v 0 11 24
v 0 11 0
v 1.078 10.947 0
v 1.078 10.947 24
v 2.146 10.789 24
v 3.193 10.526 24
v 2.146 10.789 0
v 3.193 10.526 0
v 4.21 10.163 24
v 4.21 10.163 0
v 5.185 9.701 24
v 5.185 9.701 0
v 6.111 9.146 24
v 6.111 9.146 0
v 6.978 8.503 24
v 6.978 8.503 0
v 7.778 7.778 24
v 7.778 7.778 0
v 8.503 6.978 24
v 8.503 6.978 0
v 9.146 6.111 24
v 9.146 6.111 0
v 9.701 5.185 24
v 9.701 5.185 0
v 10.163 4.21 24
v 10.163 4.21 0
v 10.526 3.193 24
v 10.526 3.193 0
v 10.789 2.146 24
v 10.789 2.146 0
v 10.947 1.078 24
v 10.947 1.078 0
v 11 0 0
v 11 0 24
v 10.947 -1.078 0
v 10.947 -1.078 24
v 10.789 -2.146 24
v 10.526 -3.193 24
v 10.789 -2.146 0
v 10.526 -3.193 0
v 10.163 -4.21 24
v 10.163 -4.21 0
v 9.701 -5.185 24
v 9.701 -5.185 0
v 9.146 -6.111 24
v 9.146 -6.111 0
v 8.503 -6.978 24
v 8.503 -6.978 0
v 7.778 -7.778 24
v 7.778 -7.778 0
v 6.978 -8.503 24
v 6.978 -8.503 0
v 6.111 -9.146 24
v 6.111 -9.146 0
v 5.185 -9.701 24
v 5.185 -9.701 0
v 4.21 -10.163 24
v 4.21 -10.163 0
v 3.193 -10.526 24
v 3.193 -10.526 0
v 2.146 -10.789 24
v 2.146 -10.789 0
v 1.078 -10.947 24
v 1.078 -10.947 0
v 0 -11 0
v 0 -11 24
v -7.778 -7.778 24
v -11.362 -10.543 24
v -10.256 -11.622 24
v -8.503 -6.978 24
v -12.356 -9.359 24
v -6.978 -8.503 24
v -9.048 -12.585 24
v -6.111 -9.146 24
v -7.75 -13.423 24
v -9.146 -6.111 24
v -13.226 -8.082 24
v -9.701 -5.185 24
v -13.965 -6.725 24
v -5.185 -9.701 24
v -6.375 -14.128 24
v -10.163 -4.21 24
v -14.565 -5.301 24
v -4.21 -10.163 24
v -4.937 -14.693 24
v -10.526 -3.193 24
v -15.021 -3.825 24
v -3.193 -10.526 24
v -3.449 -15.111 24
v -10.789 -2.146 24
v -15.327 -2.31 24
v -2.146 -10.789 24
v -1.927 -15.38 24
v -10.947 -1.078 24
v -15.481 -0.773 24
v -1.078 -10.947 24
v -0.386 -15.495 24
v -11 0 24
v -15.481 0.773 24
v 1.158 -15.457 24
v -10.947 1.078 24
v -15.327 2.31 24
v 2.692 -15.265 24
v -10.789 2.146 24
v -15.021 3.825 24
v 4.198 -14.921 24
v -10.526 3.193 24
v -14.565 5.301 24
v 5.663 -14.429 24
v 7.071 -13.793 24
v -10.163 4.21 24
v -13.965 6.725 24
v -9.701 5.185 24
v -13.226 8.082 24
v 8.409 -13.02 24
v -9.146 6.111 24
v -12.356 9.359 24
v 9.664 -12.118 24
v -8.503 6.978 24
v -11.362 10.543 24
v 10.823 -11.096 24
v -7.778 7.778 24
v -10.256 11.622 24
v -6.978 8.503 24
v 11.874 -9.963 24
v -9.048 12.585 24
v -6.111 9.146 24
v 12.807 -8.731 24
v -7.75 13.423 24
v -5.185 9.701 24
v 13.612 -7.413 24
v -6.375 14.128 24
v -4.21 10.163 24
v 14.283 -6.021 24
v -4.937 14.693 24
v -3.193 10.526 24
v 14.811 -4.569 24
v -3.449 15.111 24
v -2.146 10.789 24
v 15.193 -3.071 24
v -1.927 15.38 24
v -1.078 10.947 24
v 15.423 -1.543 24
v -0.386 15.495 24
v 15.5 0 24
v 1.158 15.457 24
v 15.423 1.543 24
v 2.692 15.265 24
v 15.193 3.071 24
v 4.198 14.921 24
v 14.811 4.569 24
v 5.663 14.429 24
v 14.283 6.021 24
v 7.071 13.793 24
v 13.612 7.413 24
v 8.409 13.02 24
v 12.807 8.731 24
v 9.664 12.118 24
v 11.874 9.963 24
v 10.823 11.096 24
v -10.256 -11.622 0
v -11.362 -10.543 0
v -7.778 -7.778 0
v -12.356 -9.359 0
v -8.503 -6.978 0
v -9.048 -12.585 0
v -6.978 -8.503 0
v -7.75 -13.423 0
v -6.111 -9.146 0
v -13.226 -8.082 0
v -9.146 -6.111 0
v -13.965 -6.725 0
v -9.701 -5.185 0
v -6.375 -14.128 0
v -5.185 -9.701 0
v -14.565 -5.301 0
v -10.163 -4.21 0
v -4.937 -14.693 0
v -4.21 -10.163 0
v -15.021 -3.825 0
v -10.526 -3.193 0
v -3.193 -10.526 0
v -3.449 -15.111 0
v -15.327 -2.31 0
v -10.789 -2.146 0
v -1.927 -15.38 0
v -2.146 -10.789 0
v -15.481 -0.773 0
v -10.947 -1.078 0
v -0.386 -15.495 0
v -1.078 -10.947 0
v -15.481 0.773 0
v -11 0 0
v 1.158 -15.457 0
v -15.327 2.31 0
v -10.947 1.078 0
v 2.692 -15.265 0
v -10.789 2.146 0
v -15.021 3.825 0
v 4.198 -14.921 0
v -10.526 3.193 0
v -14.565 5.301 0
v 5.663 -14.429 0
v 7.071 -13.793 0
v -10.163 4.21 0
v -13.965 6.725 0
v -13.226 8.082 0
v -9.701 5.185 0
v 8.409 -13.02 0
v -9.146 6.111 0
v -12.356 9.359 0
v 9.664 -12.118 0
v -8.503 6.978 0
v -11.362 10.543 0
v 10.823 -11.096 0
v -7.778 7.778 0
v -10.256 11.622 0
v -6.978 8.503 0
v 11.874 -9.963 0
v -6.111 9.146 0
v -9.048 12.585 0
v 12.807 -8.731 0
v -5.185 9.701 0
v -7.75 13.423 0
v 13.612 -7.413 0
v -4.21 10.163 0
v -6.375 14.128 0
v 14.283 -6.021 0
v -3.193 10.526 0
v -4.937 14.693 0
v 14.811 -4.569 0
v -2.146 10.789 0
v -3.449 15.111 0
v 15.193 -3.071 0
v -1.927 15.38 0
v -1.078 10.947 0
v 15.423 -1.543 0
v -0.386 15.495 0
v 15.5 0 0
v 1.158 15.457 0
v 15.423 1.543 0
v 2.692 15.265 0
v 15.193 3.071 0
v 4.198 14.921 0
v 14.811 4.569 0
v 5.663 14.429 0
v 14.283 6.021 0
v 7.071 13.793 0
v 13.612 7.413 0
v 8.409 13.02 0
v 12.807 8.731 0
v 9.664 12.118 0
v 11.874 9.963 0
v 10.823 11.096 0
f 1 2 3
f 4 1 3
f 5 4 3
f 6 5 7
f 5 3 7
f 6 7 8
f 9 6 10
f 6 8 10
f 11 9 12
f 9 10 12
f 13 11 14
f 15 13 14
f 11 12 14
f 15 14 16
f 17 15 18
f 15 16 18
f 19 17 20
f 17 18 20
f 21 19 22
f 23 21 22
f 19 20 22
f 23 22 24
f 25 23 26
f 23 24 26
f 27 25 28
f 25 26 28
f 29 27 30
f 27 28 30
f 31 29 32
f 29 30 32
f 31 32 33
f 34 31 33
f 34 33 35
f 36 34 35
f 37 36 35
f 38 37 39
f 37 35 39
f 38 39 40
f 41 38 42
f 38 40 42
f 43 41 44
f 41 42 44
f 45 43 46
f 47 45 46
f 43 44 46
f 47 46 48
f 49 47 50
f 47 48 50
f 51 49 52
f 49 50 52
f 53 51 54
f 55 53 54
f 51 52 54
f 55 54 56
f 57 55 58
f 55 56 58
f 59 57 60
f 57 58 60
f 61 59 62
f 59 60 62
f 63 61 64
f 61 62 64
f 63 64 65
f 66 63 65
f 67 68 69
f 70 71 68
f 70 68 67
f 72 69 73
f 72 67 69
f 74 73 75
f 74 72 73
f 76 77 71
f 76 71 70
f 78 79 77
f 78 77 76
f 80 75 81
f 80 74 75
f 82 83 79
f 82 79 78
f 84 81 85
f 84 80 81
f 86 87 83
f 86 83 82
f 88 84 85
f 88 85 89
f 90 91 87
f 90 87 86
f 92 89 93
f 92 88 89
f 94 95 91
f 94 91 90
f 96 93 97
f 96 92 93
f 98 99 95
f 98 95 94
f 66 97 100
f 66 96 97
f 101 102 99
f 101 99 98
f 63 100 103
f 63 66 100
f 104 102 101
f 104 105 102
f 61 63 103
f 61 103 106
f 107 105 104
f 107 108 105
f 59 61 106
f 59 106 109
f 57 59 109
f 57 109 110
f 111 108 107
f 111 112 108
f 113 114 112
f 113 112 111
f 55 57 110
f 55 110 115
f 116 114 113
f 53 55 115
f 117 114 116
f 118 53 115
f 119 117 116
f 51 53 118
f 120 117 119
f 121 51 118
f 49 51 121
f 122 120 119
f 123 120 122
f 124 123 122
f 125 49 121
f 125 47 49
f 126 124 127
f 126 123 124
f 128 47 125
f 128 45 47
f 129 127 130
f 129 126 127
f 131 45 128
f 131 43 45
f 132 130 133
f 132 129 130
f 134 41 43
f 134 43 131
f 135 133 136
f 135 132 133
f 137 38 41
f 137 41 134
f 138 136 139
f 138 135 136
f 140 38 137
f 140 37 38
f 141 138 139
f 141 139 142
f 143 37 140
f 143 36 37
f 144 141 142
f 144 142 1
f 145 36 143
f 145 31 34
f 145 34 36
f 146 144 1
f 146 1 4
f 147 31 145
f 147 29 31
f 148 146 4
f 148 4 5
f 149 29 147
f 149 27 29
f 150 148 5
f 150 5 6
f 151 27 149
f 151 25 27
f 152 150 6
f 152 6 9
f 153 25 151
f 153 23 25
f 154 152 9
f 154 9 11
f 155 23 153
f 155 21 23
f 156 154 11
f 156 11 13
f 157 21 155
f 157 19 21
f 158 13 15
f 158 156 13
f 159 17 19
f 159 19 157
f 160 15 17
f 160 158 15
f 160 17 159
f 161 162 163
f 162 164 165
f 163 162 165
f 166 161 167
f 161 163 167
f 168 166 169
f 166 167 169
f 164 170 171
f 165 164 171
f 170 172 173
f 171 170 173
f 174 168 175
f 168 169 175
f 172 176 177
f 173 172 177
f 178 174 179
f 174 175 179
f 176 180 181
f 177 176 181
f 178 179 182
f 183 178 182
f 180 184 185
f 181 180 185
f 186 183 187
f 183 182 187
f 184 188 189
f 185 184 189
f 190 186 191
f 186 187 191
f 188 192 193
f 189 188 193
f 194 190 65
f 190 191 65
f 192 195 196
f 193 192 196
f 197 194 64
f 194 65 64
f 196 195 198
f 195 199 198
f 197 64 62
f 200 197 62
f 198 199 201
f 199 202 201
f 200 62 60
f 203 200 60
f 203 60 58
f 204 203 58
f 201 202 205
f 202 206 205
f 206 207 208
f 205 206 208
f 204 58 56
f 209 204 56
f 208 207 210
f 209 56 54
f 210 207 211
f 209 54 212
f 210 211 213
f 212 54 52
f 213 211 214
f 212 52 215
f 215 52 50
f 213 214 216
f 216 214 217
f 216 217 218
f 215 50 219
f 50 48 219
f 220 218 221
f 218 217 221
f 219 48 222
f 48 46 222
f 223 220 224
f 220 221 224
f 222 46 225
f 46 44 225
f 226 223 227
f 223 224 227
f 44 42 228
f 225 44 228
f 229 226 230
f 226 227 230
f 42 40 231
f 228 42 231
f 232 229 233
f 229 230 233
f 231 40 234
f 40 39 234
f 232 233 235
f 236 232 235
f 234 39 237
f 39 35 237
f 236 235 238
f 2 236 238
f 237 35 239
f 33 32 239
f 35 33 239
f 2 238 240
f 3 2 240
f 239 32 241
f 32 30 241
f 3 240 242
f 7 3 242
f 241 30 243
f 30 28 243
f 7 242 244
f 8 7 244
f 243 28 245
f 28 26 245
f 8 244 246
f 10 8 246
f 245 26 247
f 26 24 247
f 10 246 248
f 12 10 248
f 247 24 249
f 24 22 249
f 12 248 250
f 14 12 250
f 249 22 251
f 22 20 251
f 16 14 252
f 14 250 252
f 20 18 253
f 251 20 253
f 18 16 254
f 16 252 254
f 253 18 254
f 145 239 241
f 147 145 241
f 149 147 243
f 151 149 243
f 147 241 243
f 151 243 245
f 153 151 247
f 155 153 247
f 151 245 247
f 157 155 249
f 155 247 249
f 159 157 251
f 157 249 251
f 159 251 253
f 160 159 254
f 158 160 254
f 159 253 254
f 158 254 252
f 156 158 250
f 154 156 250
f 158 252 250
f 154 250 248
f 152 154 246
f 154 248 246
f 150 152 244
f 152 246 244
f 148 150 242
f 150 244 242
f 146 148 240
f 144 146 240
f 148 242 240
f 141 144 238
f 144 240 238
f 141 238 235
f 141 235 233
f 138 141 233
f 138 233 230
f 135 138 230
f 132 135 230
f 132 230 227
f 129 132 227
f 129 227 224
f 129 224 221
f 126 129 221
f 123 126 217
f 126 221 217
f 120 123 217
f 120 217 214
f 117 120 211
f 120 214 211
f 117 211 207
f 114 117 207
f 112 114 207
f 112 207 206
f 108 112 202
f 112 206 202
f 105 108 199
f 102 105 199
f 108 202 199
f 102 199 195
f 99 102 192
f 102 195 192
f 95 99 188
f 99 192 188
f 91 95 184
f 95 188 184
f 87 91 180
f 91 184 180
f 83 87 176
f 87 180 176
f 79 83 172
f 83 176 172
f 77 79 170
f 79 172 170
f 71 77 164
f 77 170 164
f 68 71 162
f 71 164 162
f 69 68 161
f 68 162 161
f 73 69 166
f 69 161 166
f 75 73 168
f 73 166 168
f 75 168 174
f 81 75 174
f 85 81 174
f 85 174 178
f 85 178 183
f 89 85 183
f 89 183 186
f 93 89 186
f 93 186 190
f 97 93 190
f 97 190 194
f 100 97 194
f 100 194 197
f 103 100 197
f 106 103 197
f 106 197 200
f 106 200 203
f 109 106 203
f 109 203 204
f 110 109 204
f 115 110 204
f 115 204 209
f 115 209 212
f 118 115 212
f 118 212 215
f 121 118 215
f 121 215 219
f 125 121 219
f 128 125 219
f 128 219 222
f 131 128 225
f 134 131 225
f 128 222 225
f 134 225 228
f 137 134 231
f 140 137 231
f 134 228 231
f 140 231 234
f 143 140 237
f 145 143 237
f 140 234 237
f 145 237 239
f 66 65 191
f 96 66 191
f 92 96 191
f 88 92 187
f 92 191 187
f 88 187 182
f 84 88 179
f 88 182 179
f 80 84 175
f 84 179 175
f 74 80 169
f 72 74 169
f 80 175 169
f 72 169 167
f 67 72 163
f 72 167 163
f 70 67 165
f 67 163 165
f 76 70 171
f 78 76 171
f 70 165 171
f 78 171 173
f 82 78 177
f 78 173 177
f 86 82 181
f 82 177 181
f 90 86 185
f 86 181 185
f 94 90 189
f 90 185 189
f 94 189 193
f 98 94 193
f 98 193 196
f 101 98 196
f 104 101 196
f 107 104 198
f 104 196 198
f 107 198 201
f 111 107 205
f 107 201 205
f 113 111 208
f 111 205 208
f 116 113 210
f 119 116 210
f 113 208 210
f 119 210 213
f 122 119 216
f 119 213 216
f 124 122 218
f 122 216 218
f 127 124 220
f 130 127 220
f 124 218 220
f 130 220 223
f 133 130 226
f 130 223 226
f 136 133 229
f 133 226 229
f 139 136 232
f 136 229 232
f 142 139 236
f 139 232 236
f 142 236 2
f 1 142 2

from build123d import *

# Parameters (mm, degrees)
F0_R     = 15.5
F1_DEPTH = 24


with BuildPart() as f1:
    # F0 (on Top) → F1 (new body)
    with BuildSketch(Plane.XY):
        Circle(F0_R)
        with BuildLine():
            ThreePointArc((0, 11.75), (8.3085046789, 8.3085046789), (11.75, 0))
            ThreePointArc((11.75, 0), (8.3085046789, -8.3085046789), (0, -11.75))
            ThreePointArc((0, -11.75), (-8.3085046789, -8.3085046789), (-11.75, 0))
            ThreePointArc((-11.75, 0), (-8.3085046789, 8.3085046789), (0, 11.75))
        make_face(mode=Mode.SUBTRACT)
        with BuildLine():
            ThreePointArc((0, 11), (7.7781745931, 7.7781745931), (11, 0))
            Line((11, 0), (11.75, 0))
            ThreePointArc((11.75, 0), (8.3085046789, 8.3085046789), (0, 11.75))
            Line((0, 11.75), (0, 11))
        make_face()
        with BuildLine():
            ThreePointArc((-11, 0), (-7.7781745931, 7.7781745931), (0, 11))
            Line((0, 11), (0, 11.75))
            ThreePointArc((0, 11.75), (-8.3085046789, 8.3085046789), (-11.75, 0))
            Line((-11.75, 0), (-11, 0))
        make_face()
        with BuildLine():
            Line((0, -11.75), (0, -11))
            ThreePointArc((0, -11), (-7.7781745931, -7.7781745931), (-11, 0))
            Line((-11, 0), (-11.75, 0))
            ThreePointArc((-11.75, 0), (-8.3085046789, -8.3085046789), (0, -11.75))
        make_face()
        with BuildLine():
            Line((11.75, 0), (11, 0))
            ThreePointArc((11, 0), (7.7781745931, -7.7781745931), (0, -11))
            Line((0, -11), (0, -11.75))
            ThreePointArc((0, -11.75), (8.3085046789, -8.3085046789), (11.75, 0))
        make_face()
    extrude(amount=F1_DEPTH)


solid = f1.part
